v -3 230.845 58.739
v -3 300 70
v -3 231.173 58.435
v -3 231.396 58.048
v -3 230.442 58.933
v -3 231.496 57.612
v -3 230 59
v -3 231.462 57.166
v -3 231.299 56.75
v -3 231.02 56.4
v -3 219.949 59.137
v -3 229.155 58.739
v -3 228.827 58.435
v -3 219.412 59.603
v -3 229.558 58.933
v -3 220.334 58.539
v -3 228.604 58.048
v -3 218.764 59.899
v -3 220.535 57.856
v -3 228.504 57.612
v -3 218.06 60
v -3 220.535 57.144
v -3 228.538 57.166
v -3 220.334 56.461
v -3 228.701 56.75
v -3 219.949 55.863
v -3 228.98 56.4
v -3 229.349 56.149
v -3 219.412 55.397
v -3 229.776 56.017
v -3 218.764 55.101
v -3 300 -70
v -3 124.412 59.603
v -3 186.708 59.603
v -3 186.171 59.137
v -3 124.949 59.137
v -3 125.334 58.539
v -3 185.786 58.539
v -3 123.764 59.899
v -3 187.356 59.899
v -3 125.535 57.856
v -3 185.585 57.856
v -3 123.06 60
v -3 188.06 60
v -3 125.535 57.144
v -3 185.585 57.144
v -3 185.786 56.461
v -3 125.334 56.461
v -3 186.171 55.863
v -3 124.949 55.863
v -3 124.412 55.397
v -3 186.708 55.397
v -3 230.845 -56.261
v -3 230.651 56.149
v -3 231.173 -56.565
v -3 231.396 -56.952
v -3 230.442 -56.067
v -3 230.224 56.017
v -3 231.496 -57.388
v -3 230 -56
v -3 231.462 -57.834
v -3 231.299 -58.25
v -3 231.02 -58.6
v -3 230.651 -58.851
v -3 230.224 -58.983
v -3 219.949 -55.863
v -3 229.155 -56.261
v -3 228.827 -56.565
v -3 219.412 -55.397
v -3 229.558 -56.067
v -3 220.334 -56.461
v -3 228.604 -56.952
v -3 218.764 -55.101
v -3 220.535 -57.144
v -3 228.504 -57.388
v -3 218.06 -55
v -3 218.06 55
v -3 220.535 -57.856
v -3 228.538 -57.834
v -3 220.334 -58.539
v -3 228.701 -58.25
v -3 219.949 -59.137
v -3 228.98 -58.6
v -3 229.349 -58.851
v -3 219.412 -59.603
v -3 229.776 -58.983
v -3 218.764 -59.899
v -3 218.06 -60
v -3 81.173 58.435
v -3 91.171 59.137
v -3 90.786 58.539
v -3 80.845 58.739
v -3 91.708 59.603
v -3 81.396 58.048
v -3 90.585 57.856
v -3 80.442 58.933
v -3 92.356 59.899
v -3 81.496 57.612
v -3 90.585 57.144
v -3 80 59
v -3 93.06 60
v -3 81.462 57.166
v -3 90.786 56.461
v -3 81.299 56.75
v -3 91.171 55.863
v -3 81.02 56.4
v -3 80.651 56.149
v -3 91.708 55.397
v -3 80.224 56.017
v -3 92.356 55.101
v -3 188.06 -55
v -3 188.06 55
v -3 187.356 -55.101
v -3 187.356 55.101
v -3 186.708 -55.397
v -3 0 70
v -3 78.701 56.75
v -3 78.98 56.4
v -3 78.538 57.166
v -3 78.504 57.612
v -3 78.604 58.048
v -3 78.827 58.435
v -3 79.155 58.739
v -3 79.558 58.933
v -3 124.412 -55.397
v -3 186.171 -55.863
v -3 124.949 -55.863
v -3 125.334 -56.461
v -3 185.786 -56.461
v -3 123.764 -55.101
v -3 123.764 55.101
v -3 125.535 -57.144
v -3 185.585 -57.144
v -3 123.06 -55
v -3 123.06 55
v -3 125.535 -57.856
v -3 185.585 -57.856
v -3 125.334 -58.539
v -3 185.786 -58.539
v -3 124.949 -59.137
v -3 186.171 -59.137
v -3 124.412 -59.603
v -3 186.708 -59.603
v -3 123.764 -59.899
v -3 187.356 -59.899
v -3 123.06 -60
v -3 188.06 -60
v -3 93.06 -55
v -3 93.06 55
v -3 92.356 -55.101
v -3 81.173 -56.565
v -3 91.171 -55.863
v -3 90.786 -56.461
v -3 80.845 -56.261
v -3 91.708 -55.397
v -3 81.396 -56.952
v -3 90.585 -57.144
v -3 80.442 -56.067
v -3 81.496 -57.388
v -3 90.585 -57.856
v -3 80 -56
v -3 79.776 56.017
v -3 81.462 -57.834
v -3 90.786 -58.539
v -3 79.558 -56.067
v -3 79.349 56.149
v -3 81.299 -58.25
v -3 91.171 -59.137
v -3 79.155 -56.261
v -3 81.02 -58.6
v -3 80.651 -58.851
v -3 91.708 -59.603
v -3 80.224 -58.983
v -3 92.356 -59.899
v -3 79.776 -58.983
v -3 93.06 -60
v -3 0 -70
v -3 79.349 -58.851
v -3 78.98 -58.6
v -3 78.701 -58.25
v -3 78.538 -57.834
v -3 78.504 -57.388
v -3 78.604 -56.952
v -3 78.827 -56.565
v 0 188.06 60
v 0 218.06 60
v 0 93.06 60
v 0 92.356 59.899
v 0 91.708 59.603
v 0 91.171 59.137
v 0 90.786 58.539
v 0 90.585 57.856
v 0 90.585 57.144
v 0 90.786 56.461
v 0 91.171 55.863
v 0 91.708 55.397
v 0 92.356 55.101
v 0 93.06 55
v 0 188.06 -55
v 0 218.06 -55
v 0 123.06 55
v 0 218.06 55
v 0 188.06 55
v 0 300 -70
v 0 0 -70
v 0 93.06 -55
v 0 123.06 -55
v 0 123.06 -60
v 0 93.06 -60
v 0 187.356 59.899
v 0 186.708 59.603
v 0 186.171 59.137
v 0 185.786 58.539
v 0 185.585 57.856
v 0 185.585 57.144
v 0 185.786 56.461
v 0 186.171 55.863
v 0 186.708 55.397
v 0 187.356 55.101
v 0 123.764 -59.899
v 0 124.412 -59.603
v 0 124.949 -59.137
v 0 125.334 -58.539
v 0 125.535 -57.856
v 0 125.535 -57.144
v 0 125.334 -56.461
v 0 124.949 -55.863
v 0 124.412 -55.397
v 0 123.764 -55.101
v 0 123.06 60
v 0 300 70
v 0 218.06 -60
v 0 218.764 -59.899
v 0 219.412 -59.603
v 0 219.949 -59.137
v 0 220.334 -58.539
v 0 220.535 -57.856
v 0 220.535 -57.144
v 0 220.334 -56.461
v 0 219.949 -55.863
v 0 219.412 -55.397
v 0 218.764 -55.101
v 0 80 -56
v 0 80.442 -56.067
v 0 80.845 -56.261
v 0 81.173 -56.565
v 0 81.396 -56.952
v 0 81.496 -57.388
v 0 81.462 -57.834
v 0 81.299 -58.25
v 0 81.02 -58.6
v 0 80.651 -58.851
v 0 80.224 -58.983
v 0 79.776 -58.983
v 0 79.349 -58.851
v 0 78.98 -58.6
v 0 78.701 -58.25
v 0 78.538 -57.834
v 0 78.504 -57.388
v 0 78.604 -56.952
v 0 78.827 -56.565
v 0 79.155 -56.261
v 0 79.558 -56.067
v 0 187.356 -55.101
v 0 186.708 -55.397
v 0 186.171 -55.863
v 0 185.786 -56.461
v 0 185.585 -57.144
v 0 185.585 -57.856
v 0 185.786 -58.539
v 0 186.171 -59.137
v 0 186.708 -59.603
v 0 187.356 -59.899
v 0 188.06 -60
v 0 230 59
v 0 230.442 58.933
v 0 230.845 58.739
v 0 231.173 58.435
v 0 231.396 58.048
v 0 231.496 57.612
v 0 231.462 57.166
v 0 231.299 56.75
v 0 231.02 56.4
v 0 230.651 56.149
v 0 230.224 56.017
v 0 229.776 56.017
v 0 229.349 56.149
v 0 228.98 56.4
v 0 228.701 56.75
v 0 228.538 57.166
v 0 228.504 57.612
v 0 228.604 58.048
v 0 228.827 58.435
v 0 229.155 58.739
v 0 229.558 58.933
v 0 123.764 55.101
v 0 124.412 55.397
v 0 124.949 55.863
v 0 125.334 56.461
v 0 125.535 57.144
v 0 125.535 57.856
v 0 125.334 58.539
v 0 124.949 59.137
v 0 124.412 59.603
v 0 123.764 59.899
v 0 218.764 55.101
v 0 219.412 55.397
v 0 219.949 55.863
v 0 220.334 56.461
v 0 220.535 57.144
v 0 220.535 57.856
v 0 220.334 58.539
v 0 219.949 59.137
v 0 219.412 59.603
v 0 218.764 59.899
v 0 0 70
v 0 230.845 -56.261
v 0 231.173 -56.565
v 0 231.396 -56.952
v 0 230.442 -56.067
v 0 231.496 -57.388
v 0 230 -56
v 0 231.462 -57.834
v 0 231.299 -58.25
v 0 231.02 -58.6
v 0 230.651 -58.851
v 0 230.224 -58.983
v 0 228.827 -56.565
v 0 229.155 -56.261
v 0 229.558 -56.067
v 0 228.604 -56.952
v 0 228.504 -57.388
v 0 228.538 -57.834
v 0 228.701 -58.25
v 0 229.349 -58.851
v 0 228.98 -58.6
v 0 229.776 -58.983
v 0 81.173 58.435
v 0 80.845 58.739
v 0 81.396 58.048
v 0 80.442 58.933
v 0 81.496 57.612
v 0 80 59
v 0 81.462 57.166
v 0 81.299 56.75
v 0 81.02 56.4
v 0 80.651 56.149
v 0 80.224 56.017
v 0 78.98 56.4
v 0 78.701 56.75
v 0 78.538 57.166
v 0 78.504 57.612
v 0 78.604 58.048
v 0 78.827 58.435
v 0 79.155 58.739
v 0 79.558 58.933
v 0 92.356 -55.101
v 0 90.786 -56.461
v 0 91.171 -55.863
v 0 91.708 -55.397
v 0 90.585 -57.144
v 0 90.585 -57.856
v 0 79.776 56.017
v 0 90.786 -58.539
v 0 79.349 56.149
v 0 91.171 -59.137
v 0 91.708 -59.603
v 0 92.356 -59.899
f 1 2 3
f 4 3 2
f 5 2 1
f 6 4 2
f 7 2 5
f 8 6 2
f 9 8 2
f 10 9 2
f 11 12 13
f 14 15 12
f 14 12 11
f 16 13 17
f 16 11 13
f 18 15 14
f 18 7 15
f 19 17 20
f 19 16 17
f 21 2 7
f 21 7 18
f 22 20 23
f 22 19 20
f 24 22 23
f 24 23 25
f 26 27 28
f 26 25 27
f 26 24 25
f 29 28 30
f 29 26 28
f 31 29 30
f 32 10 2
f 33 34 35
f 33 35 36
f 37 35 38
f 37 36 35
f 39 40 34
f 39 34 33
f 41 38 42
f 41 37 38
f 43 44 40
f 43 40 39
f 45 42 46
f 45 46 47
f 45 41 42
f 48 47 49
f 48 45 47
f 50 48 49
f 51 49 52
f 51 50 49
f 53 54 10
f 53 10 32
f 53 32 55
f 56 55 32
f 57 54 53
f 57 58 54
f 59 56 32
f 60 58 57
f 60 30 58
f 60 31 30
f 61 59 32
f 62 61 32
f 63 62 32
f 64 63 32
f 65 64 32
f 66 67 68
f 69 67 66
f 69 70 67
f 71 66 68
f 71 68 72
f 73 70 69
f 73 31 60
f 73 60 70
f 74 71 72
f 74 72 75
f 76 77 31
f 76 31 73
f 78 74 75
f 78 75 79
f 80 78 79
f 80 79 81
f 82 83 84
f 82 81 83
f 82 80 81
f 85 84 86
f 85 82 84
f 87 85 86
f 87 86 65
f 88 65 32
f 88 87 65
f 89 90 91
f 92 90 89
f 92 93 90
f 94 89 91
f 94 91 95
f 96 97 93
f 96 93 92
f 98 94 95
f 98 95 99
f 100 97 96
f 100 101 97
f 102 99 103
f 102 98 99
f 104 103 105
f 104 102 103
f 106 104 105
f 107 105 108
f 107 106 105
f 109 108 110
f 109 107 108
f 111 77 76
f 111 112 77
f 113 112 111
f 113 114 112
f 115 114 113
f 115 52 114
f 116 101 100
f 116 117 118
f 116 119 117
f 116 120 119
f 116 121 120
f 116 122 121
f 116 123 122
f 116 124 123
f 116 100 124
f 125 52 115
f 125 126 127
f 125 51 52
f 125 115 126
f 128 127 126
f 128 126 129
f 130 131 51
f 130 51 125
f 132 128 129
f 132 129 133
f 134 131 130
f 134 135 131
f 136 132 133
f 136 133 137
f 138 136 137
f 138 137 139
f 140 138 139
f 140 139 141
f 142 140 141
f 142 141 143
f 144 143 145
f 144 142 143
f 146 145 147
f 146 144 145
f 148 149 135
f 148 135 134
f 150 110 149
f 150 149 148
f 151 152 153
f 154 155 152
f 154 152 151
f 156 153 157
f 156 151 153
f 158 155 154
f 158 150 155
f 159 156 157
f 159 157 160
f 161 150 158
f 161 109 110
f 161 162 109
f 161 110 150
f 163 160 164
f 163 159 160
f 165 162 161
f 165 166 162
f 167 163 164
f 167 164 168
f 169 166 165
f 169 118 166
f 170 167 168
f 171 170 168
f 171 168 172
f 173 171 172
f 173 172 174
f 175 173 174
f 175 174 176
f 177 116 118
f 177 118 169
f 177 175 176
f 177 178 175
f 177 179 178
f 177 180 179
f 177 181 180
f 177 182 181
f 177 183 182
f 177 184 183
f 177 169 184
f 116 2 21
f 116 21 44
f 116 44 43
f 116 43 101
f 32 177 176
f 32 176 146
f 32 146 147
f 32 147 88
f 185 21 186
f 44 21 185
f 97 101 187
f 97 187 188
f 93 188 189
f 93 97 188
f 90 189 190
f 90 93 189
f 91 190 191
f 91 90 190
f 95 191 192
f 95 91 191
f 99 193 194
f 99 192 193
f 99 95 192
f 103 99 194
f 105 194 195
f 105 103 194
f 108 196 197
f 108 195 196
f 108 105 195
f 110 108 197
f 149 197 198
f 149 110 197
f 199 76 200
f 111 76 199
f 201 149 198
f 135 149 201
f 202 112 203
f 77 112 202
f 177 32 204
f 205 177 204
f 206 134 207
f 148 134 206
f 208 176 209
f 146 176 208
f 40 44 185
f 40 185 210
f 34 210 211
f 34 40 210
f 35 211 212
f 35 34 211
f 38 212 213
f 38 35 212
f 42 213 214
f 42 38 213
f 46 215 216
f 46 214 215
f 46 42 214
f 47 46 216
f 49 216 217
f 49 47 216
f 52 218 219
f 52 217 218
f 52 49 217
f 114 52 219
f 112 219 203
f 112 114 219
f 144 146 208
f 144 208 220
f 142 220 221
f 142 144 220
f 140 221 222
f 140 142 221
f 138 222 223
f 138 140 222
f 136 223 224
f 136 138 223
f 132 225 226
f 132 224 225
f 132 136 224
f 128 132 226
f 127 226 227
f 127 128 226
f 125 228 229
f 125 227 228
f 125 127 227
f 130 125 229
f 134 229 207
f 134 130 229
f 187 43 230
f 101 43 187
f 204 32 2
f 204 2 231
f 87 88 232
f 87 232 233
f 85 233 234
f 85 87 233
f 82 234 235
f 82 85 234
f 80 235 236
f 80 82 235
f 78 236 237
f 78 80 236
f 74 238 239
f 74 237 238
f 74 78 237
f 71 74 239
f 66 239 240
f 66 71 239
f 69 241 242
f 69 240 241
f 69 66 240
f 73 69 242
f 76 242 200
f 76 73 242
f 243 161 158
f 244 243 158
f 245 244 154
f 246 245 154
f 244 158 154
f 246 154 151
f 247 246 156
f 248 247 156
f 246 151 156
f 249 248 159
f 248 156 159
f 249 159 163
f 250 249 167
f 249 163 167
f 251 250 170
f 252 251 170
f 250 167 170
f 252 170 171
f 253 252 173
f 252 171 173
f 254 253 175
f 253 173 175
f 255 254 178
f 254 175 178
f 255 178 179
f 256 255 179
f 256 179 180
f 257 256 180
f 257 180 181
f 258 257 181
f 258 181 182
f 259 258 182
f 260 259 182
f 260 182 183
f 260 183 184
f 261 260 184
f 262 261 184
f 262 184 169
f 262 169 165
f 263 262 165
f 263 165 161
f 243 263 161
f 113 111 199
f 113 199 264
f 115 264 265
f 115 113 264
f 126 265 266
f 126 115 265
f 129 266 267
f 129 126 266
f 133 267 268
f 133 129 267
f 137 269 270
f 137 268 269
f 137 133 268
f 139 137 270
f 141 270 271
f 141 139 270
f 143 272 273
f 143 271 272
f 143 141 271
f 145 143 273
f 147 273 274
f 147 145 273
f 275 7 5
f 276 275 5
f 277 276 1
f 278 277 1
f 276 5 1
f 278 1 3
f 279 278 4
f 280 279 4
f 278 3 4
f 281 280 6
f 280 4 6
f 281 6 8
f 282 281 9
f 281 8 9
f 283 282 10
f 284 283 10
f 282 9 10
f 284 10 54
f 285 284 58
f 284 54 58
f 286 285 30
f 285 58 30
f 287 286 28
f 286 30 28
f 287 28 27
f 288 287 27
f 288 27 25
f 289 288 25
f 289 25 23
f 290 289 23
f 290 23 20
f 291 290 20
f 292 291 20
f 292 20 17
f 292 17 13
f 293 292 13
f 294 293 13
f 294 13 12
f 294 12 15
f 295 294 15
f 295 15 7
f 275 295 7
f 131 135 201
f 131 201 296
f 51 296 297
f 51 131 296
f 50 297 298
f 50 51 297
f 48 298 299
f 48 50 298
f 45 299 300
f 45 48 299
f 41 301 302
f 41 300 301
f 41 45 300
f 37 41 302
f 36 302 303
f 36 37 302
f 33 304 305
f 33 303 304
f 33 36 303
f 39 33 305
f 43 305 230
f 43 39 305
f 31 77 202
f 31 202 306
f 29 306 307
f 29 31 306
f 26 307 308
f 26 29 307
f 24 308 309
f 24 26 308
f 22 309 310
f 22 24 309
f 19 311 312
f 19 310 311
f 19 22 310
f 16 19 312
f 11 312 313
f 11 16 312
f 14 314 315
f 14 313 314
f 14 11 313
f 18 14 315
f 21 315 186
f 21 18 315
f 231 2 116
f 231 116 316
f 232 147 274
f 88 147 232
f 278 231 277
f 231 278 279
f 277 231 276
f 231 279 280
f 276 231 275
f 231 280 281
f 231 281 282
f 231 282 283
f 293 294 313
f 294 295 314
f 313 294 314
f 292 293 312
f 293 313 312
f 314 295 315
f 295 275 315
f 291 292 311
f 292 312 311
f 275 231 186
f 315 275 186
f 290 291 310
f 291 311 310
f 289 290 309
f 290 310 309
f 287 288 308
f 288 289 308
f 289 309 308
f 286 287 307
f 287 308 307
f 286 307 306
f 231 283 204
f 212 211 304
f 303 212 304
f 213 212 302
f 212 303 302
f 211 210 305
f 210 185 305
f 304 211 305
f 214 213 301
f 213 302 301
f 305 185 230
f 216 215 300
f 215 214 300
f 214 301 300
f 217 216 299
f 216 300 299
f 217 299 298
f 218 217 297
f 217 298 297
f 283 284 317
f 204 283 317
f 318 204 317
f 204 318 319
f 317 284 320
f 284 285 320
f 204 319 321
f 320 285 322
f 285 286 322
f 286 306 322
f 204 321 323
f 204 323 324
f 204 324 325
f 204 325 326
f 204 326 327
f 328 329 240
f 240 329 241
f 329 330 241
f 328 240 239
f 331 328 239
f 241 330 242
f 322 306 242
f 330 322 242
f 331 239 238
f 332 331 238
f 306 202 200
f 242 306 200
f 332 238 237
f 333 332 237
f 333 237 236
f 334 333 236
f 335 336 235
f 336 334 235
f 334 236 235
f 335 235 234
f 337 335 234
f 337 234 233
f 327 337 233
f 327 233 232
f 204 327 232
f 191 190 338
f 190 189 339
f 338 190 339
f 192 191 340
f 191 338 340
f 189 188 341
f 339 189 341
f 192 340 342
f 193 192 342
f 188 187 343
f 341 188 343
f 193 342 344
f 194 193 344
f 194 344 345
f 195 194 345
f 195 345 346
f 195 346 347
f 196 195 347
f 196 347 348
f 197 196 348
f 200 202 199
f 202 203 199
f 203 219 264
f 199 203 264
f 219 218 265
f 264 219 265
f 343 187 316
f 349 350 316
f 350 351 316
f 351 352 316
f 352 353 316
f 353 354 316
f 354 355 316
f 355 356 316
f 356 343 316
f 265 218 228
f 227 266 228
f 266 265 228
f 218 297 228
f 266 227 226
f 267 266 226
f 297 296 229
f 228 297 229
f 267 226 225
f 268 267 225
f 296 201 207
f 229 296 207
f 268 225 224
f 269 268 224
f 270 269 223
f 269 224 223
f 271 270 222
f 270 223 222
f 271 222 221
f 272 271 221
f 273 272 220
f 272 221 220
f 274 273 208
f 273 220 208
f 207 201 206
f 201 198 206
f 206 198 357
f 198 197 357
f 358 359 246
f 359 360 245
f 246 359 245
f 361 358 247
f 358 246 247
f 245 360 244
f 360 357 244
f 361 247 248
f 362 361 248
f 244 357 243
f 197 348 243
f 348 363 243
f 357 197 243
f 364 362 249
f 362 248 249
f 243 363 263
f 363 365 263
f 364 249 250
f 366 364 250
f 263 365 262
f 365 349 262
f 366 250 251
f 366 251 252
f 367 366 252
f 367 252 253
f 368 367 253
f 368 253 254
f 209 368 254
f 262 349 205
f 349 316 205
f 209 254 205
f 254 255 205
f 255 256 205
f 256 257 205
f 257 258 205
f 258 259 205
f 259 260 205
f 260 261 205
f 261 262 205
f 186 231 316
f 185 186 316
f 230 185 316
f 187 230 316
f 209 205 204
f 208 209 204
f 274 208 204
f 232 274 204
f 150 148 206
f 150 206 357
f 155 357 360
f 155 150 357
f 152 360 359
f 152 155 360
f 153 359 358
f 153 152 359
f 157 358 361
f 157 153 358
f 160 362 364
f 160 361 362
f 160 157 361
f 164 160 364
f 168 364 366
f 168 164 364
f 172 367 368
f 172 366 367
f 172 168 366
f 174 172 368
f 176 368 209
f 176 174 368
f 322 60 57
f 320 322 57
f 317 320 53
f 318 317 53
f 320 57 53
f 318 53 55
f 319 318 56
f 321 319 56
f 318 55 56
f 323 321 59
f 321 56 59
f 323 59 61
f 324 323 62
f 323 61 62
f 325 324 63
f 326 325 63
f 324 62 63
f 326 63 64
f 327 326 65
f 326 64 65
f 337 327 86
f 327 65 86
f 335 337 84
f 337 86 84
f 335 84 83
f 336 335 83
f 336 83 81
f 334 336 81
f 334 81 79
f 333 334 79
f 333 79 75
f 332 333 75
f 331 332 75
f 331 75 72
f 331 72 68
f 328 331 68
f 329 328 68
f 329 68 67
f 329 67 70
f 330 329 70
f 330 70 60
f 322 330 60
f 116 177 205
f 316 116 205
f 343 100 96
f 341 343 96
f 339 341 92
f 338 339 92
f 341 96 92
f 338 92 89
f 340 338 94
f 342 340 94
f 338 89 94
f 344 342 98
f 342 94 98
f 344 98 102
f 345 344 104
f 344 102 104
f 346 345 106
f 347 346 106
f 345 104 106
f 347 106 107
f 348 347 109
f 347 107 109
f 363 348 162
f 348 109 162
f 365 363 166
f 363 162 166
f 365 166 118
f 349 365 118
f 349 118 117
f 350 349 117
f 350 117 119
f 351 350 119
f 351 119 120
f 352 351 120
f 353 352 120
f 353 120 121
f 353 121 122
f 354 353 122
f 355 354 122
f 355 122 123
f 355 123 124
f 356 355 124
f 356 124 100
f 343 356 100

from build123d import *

# Parameters (mm, degrees)
BASE_FLANGE1_OUTLINE_W = 3
BASE_FLANGE1_OUTLINE_H = 140
BASE_FLANGE1_DEPTH     = 300
SKETCH11_R             = 1.5
CUT_EXTRUDE1_DEPTH     = 10
CUT_EXTRUDE2_DEPTH     = 10


# Read off the part's stored shape, not the designer's step: Base-Flange1
with BuildPart() as part:
    # Base-Flange1 outline → Base-Flange1 (new body)
    with BuildSketch(Plane(origin=(0, 0, 0), x_dir=(1, 0, 0), z_dir=(0, 1, 0))):
        with Locations((-1.5, 0)):
            Rectangle(BASE_FLANGE1_OUTLINE_W, BASE_FLANGE1_OUTLINE_H)
    extrude(amount=BASE_FLANGE1_DEPTH)

    # Sketch11 → Cut-Extrude1 (cut)
    with BuildSketch(Plane.ZY.offset(3)):
        with Locations((-57.5, 80)):
            Circle(SKETCH11_R)
        with Locations((57.5, 80)):
            Circle(SKETCH11_R)
        with Locations((-57.5, 230)):
            Circle(SKETCH11_R)
        with Locations((57.5, 230)):
            Circle(SKETCH11_R)
    extrude(amount=-CUT_EXTRUDE1_DEPTH, mode=Mode.SUBTRACT)

    # Sketch12 → Cut-Extrude2 (cut)
    with BuildSketch(Plane.ZY.offset(3)):
        with BuildLine():
            Line((-60, 93.059956427), (-60, 123.059956427))
            ThreePointArc((-60, 123.059956427), (-57.5, 125.559956427), (-55, 123.059956427))
            Line((-55, 123.059956427), (-55, 93.059956427))
            ThreePointArc((-55, 93.059956427), (-57.5, 90.559956427), (-60, 93.059956427))
        make_face()
        with BuildLine():
            Line((-60, 188.059956427), (-60, 218.059956427))
            ThreePointArc((-60, 218.059956427), (-57.5, 220.559956427), (-55, 218.059956427))
            Line((-55, 218.059956427), (-55, 188.059956427))
            ThreePointArc((-55, 188.059956427), (-57.5, 185.559956427), (-60, 188.059956427))
        make_face()
        with BuildLine():
            Line((55, 93.059956427), (55, 123.059956427))
            ThreePointArc((55, 123.059956427), (57.5, 125.559956427), (60, 123.059956427))
            Line((60, 123.059956427), (60, 93.059956427))
            ThreePointArc((60, 93.059956427), (57.5, 90.559956427), (55, 93.059956427))
        make_face()
        with BuildLine():
            Line((60, 218.059956427), (60, 188.059956427))
            ThreePointArc((60, 188.059956427), (57.5, 185.559956427), (55, 188.059956427))
            Line((55, 188.059956427), (55, 218.059956427))
            ThreePointArc((55, 218.059956427), (57.5, 220.559956427), (60, 218.059956427))
        make_face()
    extrude(amount=-CUT_EXTRUDE2_DEPTH, mode=Mode.SUBTRACT)


solid = part.part
